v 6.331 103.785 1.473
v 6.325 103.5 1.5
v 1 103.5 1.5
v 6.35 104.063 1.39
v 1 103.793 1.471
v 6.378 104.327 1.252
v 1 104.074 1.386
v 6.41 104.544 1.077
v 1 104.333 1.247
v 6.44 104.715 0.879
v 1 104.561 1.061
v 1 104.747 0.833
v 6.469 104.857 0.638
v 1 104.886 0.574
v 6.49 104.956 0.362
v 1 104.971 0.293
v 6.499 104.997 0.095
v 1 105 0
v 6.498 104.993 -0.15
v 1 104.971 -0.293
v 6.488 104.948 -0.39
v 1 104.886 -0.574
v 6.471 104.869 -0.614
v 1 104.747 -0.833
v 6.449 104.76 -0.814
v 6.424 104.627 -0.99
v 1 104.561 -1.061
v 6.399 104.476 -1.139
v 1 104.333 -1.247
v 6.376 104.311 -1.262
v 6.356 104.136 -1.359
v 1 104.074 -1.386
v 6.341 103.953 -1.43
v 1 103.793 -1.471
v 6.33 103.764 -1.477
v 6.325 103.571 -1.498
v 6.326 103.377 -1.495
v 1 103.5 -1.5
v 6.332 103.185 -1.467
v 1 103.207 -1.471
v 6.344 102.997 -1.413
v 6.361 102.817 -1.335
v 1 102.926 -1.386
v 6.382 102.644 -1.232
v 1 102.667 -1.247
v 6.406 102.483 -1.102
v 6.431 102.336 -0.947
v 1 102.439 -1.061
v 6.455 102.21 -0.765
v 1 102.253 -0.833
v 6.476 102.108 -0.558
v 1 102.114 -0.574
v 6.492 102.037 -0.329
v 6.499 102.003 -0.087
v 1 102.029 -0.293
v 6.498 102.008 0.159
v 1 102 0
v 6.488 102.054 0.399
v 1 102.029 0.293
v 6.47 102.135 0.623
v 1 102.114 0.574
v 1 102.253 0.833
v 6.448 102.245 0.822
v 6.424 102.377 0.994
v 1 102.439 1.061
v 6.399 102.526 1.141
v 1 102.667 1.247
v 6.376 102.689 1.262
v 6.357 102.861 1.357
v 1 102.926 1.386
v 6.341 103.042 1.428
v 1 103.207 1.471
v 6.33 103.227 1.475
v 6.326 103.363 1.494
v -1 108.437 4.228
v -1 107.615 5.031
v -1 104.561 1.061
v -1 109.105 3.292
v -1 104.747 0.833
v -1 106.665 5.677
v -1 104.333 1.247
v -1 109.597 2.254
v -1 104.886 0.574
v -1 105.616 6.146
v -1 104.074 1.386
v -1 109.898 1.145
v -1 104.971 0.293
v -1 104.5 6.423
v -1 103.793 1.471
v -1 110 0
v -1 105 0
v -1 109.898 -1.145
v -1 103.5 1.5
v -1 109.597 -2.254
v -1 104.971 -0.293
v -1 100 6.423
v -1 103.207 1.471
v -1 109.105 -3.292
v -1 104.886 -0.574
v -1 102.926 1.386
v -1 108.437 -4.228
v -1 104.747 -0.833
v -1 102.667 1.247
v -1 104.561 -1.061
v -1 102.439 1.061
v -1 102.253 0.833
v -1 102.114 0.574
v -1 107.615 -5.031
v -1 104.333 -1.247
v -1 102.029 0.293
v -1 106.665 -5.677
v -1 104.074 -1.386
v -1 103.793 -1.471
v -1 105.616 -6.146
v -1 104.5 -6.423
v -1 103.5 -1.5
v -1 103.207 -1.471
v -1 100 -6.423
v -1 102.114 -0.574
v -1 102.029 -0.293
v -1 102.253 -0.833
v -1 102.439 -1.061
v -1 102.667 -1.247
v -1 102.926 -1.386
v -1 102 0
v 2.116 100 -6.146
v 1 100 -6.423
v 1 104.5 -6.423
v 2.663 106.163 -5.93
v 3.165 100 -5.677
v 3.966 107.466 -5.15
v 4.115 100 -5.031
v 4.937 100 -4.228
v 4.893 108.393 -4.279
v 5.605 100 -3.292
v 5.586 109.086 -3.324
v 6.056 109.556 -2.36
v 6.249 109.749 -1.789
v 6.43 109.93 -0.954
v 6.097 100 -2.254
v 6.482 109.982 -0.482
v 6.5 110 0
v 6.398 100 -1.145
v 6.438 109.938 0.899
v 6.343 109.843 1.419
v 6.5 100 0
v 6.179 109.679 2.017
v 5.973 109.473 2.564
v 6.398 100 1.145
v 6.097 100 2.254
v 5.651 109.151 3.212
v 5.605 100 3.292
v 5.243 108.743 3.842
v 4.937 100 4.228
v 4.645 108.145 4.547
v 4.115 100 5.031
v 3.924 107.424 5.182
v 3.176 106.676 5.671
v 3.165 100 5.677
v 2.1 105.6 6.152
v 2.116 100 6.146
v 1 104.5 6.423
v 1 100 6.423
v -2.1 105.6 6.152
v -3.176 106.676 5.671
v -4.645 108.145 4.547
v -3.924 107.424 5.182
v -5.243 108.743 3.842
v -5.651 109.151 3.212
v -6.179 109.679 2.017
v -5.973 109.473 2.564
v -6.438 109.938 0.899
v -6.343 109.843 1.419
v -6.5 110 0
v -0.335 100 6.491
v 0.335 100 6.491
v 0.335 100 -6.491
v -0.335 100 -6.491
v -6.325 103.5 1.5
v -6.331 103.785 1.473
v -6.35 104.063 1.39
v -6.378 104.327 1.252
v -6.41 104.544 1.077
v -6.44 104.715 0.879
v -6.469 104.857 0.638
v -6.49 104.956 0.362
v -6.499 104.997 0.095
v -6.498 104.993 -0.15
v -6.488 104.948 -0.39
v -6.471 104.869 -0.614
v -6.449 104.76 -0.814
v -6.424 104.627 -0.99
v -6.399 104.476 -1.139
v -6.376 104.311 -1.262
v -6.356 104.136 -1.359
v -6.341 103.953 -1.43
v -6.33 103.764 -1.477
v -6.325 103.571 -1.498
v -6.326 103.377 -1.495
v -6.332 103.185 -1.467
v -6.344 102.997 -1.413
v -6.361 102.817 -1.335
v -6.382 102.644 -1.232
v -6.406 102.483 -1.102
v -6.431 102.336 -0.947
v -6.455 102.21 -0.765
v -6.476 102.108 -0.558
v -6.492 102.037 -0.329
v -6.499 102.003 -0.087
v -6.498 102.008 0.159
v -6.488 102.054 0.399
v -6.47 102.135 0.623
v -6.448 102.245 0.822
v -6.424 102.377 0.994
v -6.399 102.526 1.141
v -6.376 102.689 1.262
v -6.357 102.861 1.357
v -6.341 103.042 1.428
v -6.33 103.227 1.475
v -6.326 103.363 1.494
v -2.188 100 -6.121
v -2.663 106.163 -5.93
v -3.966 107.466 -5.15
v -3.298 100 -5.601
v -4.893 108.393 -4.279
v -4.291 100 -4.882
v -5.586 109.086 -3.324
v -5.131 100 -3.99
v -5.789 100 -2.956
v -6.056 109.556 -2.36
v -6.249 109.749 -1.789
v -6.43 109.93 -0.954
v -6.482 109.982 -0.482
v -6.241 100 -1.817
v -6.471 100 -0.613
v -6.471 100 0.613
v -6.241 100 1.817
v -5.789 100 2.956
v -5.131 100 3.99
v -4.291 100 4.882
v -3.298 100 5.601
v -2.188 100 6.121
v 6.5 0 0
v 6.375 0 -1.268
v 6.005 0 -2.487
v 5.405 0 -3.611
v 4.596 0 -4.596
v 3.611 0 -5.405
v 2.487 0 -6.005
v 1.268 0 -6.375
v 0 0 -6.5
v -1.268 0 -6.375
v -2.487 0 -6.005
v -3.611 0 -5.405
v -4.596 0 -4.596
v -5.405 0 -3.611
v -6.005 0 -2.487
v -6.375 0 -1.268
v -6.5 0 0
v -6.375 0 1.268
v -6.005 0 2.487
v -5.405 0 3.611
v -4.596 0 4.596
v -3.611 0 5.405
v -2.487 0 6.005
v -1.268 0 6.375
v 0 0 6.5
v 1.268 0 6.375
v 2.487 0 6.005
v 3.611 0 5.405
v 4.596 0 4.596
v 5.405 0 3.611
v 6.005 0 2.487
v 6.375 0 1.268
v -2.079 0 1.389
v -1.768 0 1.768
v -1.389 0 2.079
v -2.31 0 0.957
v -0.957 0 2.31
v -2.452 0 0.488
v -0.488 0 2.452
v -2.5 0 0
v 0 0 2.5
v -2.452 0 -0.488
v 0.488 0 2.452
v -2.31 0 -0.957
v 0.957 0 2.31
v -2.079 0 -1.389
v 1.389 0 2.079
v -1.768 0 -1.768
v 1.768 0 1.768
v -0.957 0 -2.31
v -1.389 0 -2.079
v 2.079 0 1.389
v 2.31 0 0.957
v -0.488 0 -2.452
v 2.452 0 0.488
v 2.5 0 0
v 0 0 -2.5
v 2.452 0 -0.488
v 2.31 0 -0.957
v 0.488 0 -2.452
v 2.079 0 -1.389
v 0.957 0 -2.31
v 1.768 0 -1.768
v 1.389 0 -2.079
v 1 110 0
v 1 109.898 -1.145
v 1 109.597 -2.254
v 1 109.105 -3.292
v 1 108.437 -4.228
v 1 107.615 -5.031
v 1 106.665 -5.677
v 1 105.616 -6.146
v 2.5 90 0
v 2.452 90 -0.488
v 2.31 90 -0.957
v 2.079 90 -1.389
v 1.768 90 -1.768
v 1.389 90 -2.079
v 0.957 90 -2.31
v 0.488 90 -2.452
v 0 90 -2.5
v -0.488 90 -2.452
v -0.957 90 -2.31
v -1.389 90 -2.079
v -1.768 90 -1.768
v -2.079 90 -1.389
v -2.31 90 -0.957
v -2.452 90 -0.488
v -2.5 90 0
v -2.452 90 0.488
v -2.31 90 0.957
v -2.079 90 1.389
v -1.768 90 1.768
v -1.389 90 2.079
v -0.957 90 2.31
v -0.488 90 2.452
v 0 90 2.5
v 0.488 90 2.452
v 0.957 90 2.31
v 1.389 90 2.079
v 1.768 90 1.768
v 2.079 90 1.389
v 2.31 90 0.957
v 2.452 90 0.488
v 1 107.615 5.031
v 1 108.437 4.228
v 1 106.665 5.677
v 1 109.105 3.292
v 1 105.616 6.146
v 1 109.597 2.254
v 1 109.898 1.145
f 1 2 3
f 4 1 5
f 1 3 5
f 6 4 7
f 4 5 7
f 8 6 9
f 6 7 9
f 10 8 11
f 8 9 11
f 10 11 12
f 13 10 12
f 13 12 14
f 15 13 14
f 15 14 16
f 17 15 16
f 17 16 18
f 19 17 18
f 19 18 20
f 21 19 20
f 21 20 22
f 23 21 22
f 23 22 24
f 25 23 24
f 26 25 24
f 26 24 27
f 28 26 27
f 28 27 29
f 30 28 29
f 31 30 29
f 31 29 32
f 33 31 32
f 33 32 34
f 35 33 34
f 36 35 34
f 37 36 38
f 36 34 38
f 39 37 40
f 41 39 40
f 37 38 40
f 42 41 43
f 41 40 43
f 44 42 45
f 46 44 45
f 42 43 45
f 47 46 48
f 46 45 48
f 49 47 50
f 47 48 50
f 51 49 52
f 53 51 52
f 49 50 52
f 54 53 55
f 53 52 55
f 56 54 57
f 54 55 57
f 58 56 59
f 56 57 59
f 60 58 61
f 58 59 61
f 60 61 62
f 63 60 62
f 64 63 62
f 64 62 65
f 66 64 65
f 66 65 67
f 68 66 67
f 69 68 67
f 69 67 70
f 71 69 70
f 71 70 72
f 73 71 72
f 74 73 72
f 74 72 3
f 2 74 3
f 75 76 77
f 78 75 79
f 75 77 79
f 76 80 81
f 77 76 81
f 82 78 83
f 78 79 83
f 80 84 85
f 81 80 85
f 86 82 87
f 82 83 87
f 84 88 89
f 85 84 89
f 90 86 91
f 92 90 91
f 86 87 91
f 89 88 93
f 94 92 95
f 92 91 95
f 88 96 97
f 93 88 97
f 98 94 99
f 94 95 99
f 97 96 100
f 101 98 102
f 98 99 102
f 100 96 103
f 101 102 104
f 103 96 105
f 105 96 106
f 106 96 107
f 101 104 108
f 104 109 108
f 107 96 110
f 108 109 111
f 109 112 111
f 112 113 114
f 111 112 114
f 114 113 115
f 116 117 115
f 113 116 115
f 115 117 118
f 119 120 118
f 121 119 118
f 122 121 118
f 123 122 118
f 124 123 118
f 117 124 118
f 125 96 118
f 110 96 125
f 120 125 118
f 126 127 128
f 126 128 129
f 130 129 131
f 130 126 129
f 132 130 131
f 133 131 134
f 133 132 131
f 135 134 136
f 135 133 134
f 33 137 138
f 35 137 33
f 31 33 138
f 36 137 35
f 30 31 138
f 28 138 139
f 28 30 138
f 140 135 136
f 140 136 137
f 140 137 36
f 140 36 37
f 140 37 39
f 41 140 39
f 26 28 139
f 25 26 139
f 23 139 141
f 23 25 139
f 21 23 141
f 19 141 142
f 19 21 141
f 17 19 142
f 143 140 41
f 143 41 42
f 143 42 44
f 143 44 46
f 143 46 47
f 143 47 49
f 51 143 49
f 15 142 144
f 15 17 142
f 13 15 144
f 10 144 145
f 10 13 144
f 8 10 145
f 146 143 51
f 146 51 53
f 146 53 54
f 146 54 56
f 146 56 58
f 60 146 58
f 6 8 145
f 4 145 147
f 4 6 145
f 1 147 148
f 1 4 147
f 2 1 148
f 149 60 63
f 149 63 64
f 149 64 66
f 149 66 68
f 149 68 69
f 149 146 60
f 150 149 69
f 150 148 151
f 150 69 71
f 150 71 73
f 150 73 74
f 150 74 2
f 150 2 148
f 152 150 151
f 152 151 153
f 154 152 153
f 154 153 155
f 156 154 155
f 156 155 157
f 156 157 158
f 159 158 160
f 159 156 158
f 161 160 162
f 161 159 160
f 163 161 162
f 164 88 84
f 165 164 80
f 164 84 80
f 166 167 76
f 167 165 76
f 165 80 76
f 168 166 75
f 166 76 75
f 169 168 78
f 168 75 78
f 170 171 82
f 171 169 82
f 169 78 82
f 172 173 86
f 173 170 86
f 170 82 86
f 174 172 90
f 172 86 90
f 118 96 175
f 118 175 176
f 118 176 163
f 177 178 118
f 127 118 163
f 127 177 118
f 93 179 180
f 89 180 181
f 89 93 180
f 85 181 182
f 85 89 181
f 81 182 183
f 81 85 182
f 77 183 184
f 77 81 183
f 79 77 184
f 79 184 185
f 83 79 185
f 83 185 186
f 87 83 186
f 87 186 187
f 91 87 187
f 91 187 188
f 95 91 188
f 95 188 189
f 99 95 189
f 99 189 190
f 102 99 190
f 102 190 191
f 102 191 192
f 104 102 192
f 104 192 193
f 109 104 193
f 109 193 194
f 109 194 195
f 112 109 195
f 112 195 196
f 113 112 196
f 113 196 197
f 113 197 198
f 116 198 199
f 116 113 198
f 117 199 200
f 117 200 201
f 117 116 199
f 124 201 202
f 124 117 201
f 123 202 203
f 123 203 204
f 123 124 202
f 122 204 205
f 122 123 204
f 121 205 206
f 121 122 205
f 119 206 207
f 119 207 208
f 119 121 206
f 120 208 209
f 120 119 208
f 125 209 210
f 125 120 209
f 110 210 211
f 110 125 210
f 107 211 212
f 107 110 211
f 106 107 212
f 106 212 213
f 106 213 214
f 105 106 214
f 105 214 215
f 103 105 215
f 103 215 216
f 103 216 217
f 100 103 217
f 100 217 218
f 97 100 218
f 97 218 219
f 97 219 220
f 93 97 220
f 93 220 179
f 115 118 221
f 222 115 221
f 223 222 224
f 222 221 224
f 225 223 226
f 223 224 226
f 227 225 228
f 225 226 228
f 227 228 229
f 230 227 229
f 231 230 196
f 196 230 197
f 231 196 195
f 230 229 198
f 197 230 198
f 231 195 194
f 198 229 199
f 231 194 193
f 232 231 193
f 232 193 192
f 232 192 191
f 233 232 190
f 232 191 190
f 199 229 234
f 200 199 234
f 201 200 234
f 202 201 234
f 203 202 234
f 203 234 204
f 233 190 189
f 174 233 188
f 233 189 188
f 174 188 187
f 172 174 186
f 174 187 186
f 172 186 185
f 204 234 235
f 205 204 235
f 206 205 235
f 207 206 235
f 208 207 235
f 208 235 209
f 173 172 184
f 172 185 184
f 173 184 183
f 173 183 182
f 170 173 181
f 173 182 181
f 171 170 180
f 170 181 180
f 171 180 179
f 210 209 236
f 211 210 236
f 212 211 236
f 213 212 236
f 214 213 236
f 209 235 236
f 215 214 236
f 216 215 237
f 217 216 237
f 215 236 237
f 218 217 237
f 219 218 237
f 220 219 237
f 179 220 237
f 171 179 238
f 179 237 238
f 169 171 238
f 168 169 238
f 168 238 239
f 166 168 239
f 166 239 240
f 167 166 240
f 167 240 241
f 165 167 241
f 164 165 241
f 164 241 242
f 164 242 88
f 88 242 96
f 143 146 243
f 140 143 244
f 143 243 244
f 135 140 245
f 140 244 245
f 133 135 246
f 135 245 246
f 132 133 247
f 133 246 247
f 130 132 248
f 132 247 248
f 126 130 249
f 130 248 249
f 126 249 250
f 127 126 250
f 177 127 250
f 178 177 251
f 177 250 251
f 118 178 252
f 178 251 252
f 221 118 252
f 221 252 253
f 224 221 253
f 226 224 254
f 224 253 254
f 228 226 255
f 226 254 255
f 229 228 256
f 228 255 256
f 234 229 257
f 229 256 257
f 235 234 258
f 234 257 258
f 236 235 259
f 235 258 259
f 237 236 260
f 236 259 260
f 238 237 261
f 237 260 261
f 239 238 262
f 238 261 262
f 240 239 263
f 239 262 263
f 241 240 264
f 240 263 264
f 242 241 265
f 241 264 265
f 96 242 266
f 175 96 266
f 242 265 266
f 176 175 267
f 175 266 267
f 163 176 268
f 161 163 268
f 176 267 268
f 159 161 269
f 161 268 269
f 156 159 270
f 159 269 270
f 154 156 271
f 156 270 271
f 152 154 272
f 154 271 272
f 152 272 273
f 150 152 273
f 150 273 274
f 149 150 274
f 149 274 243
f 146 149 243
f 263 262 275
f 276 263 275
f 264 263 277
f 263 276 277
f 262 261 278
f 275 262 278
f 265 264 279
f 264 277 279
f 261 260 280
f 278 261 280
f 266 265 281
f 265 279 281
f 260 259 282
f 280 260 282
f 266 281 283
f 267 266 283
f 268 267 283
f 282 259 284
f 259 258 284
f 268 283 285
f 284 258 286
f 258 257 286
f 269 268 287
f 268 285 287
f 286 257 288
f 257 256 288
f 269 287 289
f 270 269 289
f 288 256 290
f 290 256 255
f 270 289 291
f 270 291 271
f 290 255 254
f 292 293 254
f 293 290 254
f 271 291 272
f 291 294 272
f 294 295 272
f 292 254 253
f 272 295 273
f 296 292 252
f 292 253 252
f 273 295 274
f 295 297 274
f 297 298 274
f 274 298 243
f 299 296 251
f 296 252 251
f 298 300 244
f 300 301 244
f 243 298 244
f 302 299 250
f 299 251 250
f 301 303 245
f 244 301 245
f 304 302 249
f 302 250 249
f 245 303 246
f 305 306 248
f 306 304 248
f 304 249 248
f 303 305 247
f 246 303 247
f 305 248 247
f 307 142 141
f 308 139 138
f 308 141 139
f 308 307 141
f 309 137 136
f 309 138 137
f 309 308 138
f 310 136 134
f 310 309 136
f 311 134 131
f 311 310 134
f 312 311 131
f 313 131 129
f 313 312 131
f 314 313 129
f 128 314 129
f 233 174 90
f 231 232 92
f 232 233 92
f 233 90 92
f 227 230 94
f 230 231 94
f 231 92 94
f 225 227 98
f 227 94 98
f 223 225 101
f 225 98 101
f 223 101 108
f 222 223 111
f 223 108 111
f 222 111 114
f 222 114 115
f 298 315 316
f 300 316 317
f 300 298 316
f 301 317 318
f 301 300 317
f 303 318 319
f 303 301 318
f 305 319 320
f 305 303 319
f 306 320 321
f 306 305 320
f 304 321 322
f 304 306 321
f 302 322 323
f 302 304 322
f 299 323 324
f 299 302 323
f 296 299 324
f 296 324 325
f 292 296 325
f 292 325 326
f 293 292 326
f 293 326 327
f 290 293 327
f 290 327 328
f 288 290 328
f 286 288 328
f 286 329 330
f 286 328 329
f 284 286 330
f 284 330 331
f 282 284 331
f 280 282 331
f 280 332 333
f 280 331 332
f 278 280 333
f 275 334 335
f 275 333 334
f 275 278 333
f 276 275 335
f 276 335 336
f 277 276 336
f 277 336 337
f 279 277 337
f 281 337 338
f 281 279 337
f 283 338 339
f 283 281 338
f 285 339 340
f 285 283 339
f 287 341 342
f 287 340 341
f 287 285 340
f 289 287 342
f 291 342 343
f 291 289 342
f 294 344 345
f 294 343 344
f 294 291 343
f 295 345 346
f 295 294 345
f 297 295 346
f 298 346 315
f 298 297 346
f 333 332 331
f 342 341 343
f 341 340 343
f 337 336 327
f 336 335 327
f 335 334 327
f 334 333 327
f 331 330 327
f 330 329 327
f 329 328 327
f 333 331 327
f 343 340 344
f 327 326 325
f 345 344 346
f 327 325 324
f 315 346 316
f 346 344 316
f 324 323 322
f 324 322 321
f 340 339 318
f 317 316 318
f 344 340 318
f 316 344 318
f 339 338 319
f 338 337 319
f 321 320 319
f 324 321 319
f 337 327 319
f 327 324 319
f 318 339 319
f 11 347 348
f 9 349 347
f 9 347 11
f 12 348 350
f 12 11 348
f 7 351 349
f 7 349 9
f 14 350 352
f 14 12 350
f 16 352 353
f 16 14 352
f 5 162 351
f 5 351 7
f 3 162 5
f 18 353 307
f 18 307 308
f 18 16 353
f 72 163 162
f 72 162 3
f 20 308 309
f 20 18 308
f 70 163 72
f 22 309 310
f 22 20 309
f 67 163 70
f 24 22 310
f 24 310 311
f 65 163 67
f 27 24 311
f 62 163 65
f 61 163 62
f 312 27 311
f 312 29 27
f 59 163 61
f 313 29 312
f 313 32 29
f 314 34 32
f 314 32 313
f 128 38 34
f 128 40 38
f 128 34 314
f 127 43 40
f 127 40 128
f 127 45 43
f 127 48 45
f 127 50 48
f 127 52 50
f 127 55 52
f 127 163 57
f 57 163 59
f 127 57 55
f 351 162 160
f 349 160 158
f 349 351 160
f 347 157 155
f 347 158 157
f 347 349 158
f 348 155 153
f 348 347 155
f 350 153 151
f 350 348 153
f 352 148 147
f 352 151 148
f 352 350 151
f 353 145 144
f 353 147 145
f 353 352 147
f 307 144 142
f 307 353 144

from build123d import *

# Parameters (mm, degrees)
SKETCH1_R               = 6.5
SKETCH1_R_2             = 2.5
BOSS_EXTRUDE1_DEPTH     = 100
SKETCH2_R               = 6.5
BOSS_EXTRUDE2_DEPTH     = 10
BOSS_EXTRUDE3_DEPTH     = 10
CUT_EXTRUDE2_DEPTH      = 7.5
CUT_EXTRUDE2_DEPTH_BACK = 7.5
SKETCH5_R               = 1.5
CUT_EXTRUDE3_DEPTH      = 8.5
CUT_EXTRUDE3_DEPTH_BACK = 6.5


with BuildPart() as part:
    # Sketch1 → Boss-Extrude1 (new body)
    with BuildSketch(Plane(origin=(0, 0, 0), x_dir=(1, 0, 0), z_dir=(0, 1, 0))):
        Circle(SKETCH1_R)
        Circle(SKETCH1_R_2, mode=Mode.SUBTRACT)
    extrude(amount=BOSS_EXTRUDE1_DEPTH)

    # Sketch2 → Boss-Extrude2 (add)
    with BuildSketch(Plane(origin=(0, 100, 0), x_dir=(1, 0, 0), z_dir=(0, 1, 0))):
        Circle(SKETCH2_R)
    extrude(amount=-BOSS_EXTRUDE2_DEPTH)

    # Sketch3 → Boss-Extrude3 (add)
    with BuildSketch(Plane(origin=(0, 100, 0), x_dir=(1, 0, 0), z_dir=(0, 1, 0))):
        with BuildLine():
            Line((-1, -6.422616), (-1, 6.422616))
            ThreePointArc((-1, 6.422616), (-6.5, 0), (-1, -6.422616))
        make_face()
        with BuildLine():
            Line((1, -6.422616), (1, 6.422616))
            ThreePointArc((1, 6.422616), (6.5, 0), (1, -6.422616))
        make_face()
    extrude(amount=BOSS_EXTRUDE3_DEPTH)

    # Sketch4 → Cut-Extrude2 (cut, two sides)
    with BuildSketch(Plane(origin=(0, 0, 0), x_dir=(0, 0, -1), z_dir=(1, 0, 0))) as cut_extrude2_sk:
        with BuildLine():
            ThreePointArc((0, 110), (4.541154, 108.150583), (6.498158, 103.654745))
            Line((6.498158, 103.654745), (6.422616, 110))
            Line((6.422616, 110), (0, 110))
        make_face()
        with BuildLine():
            Line((-6.422616, 110), (-6.498158, 103.654745))
            ThreePointArc((-6.498158, 103.654745), (-4.541154, 108.150583), (0, 110))
            Line((0, 110), (-6.422616, 110))
        make_face()
    extrude(amount=CUT_EXTRUDE2_DEPTH, mode=Mode.SUBTRACT)
    extrude(cut_extrude2_sk.sketch, amount=-CUT_EXTRUDE2_DEPTH_BACK, mode=Mode.SUBTRACT)

    # Sketch5 → Cut-Extrude3 (cut, two sides)
    with BuildSketch(Plane.ZY.offset(-1)) as cut_extrude3_sk:
        with Locations((0, 103.5)):
            Circle(SKETCH5_R)
    extrude(amount=CUT_EXTRUDE3_DEPTH, mode=Mode.SUBTRACT)
    extrude(cut_extrude3_sk.sketch, amount=-CUT_EXTRUDE3_DEPTH_BACK, mode=Mode.SUBTRACT)


solid = part.part
